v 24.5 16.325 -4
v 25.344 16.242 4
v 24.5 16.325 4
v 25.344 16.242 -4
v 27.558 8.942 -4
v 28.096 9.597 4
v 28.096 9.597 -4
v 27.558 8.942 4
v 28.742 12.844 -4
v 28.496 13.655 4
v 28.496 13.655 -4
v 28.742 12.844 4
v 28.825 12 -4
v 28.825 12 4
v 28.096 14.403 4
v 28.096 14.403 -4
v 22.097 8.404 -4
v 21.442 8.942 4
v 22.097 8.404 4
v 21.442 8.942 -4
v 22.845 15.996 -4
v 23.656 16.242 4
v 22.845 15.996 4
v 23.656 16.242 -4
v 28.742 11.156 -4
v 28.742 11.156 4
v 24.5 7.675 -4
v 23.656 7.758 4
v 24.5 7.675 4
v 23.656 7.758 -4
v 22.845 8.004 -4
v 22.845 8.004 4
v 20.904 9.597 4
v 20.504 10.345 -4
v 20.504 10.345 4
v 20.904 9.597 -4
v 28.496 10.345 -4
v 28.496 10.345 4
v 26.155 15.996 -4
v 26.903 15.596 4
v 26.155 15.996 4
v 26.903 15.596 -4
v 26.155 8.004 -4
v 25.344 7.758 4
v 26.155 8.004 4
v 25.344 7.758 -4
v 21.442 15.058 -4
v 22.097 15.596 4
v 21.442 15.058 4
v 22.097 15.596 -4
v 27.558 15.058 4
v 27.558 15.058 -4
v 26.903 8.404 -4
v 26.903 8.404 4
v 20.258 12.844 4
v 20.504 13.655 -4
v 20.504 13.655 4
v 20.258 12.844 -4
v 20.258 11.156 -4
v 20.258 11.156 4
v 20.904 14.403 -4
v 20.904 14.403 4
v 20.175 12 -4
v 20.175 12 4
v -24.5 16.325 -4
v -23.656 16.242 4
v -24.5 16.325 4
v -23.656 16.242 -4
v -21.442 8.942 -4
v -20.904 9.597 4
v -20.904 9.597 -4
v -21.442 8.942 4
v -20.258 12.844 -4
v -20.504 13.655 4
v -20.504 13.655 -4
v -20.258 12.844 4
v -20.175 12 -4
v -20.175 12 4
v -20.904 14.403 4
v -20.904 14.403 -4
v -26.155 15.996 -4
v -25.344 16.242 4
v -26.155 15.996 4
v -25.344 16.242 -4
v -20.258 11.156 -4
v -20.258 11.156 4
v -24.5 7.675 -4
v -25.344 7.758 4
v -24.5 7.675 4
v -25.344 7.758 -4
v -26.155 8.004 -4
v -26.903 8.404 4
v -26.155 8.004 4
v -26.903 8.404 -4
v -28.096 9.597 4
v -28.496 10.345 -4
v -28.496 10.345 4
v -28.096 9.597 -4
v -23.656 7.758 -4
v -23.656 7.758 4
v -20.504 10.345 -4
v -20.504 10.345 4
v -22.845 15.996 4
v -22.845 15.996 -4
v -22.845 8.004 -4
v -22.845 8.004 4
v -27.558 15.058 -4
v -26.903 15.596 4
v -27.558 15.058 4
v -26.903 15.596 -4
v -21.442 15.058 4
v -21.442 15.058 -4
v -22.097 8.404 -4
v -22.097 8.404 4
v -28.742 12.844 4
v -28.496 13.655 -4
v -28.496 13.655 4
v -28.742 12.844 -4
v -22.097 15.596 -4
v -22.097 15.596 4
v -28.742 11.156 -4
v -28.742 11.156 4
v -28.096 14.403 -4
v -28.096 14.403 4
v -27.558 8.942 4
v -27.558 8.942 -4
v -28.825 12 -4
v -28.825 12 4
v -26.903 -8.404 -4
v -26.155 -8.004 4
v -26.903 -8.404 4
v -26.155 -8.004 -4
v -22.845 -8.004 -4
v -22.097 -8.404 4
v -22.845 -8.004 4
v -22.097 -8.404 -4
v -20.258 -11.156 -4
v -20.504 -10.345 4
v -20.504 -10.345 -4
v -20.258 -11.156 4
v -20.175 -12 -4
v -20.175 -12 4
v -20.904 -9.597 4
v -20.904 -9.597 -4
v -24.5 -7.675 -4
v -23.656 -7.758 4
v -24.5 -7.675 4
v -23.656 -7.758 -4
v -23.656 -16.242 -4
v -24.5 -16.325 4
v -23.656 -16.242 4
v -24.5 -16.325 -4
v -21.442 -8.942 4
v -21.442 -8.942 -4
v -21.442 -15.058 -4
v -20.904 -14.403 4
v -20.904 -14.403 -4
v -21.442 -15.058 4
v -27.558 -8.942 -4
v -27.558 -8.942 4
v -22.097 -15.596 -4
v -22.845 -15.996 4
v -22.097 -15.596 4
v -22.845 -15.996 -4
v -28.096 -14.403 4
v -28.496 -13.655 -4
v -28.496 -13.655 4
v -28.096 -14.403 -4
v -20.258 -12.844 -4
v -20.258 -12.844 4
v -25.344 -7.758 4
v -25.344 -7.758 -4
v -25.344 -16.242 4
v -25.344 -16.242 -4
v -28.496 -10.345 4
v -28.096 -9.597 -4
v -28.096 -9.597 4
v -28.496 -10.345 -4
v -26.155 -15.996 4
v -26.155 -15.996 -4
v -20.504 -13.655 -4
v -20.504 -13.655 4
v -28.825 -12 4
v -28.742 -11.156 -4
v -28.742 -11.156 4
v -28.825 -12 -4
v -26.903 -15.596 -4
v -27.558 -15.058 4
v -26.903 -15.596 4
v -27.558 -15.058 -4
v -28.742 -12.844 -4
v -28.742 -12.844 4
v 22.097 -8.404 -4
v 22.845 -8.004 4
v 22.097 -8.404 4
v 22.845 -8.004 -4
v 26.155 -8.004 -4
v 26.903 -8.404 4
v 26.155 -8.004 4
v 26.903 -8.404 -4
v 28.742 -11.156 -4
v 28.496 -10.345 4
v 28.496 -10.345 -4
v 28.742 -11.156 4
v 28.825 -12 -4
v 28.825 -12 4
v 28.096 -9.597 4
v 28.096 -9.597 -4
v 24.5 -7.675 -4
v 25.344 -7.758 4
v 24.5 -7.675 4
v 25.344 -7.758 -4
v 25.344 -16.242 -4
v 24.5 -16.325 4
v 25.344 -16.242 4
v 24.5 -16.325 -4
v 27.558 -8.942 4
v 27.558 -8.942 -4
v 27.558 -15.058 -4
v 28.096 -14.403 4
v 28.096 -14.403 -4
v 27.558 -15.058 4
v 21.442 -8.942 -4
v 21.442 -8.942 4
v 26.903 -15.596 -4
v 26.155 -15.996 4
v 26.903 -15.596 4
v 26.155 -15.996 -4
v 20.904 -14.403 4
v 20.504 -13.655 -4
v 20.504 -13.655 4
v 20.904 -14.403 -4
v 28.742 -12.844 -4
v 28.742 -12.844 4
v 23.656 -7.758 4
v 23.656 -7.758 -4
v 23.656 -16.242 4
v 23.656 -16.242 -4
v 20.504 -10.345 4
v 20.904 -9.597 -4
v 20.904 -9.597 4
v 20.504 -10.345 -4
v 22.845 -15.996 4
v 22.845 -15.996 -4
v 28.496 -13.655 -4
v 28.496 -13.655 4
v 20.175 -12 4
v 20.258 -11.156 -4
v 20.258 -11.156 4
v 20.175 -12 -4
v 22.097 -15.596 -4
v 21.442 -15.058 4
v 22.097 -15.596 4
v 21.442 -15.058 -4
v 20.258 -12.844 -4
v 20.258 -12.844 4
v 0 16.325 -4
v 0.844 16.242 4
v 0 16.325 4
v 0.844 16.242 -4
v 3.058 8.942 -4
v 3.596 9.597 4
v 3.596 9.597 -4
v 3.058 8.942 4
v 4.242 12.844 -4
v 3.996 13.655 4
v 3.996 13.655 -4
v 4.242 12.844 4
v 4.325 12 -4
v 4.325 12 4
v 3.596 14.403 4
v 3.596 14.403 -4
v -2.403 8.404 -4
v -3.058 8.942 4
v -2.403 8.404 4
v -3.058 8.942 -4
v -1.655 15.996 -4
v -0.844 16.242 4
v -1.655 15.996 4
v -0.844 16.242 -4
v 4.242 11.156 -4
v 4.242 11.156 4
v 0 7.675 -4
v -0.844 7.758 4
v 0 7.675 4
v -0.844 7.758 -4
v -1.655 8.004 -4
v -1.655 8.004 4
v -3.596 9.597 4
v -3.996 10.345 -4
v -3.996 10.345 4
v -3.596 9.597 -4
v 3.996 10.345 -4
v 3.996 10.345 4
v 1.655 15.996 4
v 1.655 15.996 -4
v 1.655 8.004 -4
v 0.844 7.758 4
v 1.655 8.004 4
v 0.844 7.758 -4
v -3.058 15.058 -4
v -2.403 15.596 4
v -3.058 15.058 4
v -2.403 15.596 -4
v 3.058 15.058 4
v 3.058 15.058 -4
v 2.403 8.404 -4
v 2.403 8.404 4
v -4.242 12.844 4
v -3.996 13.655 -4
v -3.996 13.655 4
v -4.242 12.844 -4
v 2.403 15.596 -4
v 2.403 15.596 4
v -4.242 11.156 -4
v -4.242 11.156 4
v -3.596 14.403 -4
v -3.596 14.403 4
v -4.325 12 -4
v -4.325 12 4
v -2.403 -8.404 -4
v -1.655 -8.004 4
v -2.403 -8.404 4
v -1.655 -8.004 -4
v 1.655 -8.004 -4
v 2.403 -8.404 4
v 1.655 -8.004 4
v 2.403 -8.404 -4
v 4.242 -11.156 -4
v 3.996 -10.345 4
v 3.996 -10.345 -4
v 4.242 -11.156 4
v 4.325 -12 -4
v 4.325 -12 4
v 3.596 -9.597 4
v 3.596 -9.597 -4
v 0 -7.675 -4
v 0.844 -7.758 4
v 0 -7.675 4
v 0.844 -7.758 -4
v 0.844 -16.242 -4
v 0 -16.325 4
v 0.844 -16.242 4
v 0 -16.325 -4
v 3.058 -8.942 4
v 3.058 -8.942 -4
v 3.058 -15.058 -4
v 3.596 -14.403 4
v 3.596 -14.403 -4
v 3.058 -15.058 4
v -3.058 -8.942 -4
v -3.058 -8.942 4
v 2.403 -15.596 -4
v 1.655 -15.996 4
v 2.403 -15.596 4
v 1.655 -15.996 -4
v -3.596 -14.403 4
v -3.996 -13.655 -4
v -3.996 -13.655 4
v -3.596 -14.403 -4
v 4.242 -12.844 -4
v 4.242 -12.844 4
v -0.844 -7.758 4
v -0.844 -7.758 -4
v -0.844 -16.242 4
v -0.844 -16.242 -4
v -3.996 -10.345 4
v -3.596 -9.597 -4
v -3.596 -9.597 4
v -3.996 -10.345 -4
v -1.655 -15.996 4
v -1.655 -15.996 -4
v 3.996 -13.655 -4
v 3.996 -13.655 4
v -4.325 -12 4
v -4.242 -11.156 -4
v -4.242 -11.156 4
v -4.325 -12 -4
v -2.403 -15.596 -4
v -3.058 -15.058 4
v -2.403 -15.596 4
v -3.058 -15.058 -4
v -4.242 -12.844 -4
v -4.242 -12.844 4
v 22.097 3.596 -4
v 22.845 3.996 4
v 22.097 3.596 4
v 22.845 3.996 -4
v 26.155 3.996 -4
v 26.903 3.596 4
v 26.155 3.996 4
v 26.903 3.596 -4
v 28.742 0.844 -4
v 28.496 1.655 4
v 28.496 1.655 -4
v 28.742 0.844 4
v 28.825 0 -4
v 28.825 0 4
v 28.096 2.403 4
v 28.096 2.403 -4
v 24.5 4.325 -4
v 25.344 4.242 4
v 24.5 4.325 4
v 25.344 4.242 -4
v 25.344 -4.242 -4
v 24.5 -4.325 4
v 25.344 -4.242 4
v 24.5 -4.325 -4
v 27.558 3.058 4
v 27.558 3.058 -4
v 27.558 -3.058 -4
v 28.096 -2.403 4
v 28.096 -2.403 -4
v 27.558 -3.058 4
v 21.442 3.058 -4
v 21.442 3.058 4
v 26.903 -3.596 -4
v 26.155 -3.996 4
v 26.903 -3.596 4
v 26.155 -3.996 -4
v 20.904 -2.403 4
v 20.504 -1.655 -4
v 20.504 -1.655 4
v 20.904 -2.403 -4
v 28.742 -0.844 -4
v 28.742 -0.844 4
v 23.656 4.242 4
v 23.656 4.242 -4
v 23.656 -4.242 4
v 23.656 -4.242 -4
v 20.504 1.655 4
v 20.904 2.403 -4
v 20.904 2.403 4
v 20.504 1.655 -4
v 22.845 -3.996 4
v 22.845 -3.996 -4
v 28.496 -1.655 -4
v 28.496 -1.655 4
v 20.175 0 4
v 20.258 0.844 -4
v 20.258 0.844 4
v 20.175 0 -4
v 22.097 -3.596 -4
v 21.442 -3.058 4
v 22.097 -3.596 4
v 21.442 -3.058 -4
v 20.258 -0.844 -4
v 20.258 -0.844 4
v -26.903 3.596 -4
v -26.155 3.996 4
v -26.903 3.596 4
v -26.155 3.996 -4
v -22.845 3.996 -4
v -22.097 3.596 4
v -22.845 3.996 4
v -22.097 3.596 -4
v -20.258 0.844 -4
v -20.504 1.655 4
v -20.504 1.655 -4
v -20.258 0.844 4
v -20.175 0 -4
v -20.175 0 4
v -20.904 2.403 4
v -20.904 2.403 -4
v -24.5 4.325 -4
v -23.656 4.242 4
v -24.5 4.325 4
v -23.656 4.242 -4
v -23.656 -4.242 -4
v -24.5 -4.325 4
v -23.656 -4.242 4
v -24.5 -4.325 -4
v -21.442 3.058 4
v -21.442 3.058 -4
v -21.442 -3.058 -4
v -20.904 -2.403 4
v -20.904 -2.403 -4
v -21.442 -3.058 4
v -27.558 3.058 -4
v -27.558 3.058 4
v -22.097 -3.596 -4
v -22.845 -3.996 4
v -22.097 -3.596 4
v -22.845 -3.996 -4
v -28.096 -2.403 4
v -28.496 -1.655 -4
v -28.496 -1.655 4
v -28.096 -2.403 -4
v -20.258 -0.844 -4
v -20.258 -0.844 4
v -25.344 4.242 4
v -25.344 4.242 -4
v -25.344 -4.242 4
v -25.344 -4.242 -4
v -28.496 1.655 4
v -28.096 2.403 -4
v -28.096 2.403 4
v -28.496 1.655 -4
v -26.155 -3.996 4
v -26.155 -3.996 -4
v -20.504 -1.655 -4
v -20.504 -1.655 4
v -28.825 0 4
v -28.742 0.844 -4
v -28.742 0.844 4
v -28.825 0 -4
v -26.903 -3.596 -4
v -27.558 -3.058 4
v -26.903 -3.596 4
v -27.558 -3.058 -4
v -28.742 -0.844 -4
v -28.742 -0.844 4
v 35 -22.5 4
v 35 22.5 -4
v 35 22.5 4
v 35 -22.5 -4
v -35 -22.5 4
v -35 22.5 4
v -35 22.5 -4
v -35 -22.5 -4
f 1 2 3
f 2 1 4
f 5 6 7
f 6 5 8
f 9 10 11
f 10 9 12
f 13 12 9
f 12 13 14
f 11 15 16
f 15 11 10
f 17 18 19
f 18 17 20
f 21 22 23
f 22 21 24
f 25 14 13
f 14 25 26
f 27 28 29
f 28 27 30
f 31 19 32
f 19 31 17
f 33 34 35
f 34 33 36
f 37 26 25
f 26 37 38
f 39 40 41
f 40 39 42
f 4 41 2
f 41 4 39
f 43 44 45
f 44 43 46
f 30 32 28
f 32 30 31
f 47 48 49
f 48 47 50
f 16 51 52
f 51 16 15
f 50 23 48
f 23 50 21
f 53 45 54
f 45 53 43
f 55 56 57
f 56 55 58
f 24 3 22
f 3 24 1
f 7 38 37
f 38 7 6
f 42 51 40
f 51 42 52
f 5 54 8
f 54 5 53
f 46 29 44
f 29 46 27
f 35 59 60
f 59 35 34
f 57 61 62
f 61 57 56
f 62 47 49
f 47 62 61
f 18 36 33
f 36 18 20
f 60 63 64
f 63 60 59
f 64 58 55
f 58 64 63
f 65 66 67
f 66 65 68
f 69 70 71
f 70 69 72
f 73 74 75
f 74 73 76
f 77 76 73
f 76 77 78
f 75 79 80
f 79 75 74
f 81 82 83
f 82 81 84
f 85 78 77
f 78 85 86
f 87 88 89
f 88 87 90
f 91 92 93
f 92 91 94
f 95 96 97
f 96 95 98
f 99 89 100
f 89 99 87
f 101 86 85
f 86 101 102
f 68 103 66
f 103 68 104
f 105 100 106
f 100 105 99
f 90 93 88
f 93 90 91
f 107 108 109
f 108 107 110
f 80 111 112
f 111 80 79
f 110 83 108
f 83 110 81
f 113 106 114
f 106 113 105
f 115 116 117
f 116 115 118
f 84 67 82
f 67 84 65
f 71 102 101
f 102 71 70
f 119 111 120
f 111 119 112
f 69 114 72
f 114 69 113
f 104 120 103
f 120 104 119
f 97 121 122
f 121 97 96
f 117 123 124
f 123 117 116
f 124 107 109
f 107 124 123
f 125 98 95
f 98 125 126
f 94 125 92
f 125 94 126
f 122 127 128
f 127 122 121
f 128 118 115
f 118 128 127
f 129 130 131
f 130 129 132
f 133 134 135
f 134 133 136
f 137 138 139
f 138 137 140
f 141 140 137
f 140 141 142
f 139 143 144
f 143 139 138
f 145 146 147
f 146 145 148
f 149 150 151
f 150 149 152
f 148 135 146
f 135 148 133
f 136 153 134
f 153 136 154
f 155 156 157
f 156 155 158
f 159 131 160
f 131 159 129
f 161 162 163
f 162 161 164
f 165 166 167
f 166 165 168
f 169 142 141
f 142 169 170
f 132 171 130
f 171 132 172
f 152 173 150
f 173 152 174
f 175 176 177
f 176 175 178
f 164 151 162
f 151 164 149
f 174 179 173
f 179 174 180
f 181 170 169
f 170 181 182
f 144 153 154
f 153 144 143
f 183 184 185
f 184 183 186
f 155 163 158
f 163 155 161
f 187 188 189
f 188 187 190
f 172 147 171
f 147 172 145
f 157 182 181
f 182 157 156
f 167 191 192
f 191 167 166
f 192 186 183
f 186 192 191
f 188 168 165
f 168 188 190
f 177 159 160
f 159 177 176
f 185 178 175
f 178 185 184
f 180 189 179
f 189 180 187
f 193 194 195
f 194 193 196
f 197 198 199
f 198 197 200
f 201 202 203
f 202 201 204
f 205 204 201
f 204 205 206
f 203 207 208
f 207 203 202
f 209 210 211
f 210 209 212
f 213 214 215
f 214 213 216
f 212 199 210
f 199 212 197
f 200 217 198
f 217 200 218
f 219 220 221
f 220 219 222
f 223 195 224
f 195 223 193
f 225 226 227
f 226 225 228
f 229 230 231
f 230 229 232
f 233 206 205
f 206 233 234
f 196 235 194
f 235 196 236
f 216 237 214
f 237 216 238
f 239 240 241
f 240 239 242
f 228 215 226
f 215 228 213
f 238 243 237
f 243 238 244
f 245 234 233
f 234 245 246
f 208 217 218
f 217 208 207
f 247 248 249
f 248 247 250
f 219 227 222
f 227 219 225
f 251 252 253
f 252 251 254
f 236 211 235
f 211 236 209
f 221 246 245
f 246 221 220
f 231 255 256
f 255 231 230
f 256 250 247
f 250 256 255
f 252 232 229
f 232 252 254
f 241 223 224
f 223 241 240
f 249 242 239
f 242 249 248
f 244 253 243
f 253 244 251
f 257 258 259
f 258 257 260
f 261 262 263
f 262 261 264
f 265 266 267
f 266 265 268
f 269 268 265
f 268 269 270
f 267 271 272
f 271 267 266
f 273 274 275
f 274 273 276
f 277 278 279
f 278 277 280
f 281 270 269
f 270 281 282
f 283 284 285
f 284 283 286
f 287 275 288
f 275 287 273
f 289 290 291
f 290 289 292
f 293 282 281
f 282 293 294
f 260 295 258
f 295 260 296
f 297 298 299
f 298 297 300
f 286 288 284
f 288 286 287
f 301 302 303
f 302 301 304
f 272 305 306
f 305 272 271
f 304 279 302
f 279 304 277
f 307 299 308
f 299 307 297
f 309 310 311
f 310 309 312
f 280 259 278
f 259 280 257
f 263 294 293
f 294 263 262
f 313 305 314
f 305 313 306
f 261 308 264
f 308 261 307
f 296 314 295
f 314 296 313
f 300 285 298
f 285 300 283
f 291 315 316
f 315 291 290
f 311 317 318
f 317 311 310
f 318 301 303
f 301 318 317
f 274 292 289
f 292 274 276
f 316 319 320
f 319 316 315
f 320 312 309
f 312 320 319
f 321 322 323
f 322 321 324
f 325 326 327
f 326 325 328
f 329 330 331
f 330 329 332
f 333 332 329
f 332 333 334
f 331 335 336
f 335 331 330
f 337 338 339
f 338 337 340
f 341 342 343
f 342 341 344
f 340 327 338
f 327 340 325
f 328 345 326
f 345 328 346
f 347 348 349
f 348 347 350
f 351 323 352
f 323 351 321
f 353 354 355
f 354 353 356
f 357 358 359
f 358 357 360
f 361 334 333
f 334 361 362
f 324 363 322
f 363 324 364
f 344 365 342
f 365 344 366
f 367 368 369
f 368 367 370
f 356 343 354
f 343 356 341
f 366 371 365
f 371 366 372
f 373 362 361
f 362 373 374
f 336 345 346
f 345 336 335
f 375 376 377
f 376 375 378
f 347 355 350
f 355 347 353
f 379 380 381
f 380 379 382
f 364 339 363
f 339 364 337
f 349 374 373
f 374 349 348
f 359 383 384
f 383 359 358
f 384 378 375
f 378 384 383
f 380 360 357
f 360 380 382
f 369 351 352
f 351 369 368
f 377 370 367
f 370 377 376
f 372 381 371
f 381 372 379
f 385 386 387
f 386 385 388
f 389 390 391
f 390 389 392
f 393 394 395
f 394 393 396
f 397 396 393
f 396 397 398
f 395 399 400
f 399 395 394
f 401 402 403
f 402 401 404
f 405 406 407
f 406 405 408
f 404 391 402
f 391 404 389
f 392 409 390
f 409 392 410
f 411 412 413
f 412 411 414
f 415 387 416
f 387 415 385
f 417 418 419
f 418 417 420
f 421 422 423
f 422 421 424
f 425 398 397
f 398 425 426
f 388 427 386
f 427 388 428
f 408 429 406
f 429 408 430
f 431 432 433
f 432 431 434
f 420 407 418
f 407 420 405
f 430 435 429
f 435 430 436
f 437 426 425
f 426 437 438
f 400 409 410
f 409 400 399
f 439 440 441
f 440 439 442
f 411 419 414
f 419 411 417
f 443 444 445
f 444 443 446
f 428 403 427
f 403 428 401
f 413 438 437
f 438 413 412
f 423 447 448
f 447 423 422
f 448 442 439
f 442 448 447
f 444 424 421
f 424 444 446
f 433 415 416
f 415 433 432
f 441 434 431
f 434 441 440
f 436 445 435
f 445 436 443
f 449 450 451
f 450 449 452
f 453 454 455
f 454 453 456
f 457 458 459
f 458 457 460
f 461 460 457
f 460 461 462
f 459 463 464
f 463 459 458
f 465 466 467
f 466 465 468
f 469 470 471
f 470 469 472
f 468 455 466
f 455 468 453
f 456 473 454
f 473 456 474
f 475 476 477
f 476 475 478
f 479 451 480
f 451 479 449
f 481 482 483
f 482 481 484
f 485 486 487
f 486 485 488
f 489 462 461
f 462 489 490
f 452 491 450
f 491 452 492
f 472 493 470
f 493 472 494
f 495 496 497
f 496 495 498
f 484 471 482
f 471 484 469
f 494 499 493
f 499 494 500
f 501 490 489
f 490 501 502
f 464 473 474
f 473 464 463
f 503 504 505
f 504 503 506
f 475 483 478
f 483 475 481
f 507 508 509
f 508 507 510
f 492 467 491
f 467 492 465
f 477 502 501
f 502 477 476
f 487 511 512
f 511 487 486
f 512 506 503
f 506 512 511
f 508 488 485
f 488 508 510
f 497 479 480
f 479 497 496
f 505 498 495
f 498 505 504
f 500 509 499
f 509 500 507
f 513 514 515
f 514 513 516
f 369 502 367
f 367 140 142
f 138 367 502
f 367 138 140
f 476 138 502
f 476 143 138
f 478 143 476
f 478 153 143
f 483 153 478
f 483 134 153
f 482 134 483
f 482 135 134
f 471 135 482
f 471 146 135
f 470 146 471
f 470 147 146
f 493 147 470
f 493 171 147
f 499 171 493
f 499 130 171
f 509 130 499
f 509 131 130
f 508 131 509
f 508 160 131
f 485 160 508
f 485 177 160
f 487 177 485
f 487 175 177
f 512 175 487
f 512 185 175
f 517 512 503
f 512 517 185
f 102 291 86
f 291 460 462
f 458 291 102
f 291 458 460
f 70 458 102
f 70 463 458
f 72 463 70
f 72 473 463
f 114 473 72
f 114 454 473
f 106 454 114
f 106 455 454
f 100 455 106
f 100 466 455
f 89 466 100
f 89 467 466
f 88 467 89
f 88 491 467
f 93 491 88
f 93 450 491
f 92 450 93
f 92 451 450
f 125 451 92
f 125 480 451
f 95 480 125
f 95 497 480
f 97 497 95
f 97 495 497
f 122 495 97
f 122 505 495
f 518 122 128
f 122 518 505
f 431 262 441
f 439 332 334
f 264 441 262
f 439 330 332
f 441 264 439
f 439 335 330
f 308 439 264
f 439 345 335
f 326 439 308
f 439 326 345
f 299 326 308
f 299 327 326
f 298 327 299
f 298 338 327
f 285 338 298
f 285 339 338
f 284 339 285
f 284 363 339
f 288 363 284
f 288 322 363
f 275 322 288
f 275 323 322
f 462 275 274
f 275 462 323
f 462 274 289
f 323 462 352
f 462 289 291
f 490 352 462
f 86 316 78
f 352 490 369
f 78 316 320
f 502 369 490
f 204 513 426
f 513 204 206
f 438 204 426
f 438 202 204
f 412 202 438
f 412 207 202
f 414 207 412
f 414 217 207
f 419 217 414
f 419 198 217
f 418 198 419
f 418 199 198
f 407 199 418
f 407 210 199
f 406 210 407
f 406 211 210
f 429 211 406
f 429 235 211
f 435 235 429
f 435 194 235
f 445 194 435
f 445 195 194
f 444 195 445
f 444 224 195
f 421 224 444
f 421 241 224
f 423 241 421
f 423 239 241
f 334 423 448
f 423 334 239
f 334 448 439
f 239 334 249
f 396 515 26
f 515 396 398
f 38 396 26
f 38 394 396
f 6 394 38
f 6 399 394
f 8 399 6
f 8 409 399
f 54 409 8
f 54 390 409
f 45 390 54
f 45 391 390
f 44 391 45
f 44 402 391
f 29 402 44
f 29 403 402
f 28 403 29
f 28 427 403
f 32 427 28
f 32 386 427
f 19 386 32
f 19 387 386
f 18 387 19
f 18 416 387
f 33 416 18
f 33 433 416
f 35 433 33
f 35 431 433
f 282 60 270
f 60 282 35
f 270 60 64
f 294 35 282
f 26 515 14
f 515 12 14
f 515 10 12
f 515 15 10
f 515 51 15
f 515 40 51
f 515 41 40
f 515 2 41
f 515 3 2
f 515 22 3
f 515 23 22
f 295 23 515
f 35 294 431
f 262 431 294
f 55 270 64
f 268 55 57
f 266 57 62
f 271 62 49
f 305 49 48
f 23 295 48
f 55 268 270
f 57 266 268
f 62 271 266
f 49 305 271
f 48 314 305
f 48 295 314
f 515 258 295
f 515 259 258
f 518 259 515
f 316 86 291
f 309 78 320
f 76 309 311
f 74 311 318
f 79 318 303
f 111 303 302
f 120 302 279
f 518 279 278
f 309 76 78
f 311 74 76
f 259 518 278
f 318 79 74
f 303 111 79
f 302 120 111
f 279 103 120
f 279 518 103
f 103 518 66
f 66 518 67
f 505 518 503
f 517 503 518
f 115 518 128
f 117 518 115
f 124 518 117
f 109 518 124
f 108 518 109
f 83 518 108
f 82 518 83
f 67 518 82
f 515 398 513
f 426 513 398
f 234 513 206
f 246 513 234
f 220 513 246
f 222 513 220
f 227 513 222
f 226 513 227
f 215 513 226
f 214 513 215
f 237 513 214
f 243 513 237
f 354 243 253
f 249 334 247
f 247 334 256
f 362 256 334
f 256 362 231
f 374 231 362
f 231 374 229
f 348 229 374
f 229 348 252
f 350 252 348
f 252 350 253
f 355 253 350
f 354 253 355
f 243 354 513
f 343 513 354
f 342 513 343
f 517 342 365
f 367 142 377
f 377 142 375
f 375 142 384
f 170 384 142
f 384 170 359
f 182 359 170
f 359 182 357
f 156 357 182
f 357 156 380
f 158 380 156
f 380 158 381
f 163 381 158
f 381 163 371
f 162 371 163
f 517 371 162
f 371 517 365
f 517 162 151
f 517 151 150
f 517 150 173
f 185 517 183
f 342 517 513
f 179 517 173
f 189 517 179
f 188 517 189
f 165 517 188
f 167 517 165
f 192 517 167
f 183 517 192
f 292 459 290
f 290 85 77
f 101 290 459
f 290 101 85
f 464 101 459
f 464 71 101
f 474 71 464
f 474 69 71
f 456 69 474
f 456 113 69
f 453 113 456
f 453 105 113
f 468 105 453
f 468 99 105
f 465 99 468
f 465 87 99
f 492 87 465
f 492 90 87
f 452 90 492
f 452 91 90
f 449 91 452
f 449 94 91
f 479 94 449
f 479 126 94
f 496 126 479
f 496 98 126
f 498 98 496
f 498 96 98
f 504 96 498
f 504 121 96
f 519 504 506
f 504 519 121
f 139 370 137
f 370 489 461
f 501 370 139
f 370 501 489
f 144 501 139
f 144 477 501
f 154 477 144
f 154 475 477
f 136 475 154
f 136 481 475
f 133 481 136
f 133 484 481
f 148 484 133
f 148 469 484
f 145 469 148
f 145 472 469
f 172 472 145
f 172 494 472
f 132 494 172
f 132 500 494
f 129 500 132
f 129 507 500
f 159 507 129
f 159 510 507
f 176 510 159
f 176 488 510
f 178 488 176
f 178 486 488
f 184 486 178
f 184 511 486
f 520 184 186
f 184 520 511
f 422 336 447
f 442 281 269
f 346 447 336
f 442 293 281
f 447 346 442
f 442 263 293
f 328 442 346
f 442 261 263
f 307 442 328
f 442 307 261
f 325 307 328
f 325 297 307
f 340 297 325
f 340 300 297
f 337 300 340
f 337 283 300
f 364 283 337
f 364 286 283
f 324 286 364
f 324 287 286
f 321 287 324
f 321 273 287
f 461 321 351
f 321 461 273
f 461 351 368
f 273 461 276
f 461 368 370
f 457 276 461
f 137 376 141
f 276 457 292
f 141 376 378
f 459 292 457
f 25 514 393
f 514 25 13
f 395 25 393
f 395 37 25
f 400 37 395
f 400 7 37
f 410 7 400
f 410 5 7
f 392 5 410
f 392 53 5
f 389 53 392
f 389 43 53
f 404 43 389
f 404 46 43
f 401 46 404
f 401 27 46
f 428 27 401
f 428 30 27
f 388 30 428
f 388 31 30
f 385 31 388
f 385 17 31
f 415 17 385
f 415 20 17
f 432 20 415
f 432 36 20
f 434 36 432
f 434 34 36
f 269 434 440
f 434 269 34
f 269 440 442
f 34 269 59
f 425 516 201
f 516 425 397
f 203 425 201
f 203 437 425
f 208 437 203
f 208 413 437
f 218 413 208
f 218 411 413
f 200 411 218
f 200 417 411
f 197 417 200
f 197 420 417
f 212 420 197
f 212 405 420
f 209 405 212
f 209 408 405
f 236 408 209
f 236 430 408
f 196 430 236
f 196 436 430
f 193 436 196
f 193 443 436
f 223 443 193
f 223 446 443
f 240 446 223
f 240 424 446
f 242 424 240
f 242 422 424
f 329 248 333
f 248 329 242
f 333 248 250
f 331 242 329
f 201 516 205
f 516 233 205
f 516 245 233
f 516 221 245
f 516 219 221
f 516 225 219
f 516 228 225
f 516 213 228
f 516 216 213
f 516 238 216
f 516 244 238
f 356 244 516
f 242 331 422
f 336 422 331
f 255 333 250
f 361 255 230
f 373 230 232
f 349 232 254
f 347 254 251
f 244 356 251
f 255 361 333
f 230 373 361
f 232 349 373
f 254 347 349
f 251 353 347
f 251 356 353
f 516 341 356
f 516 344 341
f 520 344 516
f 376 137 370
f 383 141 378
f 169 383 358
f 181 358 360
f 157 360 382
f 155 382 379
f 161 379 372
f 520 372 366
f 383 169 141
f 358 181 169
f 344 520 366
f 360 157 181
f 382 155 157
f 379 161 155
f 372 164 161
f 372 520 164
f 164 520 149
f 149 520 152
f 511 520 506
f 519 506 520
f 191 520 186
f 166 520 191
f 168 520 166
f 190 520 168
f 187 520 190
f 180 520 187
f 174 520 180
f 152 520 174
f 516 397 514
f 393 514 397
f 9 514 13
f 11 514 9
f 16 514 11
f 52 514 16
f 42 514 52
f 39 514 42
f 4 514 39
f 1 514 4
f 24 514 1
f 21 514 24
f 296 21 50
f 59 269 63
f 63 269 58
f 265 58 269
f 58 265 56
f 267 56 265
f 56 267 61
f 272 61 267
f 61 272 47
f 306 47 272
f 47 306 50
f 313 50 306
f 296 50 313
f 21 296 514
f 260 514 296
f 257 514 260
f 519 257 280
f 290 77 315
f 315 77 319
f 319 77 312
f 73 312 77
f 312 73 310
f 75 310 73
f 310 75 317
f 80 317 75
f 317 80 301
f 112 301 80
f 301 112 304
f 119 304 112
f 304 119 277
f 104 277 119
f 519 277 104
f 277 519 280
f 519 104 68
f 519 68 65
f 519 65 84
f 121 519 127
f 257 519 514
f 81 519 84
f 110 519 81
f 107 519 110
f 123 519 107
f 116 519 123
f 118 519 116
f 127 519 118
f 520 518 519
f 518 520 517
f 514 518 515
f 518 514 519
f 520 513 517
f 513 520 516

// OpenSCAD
$fn = 32;

// ----------------------------------------------------------------------
// Corner plate 70 x 45 x 8
// 8 holes, centres taken from the edge offset
// ----------------------------------------------------------------------

// --- parameters (mm) ---
plate = [70, 45, 8];     // overall size (x, y, z)
holes = 8;               // number of holes the drawing asks for
bore_d = 8.4;            // nominal hole diameter from the drawing
print_allowance = 0.25;  // clearance added for printing
edge = 10.5;             // hole centre offset from the plate edge

// --- derived feature positions (mm) ---
hole_d = bore_d + print_allowance;  // = 8.65   hole diameter as printed
corner_x = plate[0] / 2 - edge;     // = 24.5   corner hole X
corner_y = plate[1] / 2 - edge;     // = 12   corner hole Y
feature_centers = [
  [corner_x, corner_y],
  [-corner_x, corner_y],
  [-corner_x, -corner_y],
  [corner_x, -corner_y],
  [0, corner_y],
  [0, -corner_y],
  [corner_x, 0],
  [-corner_x, 0]
];   // hole centres the loop below drills

// plate outline, every hole drilled through with the same cutters
difference() {
  cube(plate, center = true);
  for (centre = feature_centers)
    translate([centre[0], centre[1], 0])
      cylinder(d = hole_d, h = plate[2] + 2, center = true);
}
